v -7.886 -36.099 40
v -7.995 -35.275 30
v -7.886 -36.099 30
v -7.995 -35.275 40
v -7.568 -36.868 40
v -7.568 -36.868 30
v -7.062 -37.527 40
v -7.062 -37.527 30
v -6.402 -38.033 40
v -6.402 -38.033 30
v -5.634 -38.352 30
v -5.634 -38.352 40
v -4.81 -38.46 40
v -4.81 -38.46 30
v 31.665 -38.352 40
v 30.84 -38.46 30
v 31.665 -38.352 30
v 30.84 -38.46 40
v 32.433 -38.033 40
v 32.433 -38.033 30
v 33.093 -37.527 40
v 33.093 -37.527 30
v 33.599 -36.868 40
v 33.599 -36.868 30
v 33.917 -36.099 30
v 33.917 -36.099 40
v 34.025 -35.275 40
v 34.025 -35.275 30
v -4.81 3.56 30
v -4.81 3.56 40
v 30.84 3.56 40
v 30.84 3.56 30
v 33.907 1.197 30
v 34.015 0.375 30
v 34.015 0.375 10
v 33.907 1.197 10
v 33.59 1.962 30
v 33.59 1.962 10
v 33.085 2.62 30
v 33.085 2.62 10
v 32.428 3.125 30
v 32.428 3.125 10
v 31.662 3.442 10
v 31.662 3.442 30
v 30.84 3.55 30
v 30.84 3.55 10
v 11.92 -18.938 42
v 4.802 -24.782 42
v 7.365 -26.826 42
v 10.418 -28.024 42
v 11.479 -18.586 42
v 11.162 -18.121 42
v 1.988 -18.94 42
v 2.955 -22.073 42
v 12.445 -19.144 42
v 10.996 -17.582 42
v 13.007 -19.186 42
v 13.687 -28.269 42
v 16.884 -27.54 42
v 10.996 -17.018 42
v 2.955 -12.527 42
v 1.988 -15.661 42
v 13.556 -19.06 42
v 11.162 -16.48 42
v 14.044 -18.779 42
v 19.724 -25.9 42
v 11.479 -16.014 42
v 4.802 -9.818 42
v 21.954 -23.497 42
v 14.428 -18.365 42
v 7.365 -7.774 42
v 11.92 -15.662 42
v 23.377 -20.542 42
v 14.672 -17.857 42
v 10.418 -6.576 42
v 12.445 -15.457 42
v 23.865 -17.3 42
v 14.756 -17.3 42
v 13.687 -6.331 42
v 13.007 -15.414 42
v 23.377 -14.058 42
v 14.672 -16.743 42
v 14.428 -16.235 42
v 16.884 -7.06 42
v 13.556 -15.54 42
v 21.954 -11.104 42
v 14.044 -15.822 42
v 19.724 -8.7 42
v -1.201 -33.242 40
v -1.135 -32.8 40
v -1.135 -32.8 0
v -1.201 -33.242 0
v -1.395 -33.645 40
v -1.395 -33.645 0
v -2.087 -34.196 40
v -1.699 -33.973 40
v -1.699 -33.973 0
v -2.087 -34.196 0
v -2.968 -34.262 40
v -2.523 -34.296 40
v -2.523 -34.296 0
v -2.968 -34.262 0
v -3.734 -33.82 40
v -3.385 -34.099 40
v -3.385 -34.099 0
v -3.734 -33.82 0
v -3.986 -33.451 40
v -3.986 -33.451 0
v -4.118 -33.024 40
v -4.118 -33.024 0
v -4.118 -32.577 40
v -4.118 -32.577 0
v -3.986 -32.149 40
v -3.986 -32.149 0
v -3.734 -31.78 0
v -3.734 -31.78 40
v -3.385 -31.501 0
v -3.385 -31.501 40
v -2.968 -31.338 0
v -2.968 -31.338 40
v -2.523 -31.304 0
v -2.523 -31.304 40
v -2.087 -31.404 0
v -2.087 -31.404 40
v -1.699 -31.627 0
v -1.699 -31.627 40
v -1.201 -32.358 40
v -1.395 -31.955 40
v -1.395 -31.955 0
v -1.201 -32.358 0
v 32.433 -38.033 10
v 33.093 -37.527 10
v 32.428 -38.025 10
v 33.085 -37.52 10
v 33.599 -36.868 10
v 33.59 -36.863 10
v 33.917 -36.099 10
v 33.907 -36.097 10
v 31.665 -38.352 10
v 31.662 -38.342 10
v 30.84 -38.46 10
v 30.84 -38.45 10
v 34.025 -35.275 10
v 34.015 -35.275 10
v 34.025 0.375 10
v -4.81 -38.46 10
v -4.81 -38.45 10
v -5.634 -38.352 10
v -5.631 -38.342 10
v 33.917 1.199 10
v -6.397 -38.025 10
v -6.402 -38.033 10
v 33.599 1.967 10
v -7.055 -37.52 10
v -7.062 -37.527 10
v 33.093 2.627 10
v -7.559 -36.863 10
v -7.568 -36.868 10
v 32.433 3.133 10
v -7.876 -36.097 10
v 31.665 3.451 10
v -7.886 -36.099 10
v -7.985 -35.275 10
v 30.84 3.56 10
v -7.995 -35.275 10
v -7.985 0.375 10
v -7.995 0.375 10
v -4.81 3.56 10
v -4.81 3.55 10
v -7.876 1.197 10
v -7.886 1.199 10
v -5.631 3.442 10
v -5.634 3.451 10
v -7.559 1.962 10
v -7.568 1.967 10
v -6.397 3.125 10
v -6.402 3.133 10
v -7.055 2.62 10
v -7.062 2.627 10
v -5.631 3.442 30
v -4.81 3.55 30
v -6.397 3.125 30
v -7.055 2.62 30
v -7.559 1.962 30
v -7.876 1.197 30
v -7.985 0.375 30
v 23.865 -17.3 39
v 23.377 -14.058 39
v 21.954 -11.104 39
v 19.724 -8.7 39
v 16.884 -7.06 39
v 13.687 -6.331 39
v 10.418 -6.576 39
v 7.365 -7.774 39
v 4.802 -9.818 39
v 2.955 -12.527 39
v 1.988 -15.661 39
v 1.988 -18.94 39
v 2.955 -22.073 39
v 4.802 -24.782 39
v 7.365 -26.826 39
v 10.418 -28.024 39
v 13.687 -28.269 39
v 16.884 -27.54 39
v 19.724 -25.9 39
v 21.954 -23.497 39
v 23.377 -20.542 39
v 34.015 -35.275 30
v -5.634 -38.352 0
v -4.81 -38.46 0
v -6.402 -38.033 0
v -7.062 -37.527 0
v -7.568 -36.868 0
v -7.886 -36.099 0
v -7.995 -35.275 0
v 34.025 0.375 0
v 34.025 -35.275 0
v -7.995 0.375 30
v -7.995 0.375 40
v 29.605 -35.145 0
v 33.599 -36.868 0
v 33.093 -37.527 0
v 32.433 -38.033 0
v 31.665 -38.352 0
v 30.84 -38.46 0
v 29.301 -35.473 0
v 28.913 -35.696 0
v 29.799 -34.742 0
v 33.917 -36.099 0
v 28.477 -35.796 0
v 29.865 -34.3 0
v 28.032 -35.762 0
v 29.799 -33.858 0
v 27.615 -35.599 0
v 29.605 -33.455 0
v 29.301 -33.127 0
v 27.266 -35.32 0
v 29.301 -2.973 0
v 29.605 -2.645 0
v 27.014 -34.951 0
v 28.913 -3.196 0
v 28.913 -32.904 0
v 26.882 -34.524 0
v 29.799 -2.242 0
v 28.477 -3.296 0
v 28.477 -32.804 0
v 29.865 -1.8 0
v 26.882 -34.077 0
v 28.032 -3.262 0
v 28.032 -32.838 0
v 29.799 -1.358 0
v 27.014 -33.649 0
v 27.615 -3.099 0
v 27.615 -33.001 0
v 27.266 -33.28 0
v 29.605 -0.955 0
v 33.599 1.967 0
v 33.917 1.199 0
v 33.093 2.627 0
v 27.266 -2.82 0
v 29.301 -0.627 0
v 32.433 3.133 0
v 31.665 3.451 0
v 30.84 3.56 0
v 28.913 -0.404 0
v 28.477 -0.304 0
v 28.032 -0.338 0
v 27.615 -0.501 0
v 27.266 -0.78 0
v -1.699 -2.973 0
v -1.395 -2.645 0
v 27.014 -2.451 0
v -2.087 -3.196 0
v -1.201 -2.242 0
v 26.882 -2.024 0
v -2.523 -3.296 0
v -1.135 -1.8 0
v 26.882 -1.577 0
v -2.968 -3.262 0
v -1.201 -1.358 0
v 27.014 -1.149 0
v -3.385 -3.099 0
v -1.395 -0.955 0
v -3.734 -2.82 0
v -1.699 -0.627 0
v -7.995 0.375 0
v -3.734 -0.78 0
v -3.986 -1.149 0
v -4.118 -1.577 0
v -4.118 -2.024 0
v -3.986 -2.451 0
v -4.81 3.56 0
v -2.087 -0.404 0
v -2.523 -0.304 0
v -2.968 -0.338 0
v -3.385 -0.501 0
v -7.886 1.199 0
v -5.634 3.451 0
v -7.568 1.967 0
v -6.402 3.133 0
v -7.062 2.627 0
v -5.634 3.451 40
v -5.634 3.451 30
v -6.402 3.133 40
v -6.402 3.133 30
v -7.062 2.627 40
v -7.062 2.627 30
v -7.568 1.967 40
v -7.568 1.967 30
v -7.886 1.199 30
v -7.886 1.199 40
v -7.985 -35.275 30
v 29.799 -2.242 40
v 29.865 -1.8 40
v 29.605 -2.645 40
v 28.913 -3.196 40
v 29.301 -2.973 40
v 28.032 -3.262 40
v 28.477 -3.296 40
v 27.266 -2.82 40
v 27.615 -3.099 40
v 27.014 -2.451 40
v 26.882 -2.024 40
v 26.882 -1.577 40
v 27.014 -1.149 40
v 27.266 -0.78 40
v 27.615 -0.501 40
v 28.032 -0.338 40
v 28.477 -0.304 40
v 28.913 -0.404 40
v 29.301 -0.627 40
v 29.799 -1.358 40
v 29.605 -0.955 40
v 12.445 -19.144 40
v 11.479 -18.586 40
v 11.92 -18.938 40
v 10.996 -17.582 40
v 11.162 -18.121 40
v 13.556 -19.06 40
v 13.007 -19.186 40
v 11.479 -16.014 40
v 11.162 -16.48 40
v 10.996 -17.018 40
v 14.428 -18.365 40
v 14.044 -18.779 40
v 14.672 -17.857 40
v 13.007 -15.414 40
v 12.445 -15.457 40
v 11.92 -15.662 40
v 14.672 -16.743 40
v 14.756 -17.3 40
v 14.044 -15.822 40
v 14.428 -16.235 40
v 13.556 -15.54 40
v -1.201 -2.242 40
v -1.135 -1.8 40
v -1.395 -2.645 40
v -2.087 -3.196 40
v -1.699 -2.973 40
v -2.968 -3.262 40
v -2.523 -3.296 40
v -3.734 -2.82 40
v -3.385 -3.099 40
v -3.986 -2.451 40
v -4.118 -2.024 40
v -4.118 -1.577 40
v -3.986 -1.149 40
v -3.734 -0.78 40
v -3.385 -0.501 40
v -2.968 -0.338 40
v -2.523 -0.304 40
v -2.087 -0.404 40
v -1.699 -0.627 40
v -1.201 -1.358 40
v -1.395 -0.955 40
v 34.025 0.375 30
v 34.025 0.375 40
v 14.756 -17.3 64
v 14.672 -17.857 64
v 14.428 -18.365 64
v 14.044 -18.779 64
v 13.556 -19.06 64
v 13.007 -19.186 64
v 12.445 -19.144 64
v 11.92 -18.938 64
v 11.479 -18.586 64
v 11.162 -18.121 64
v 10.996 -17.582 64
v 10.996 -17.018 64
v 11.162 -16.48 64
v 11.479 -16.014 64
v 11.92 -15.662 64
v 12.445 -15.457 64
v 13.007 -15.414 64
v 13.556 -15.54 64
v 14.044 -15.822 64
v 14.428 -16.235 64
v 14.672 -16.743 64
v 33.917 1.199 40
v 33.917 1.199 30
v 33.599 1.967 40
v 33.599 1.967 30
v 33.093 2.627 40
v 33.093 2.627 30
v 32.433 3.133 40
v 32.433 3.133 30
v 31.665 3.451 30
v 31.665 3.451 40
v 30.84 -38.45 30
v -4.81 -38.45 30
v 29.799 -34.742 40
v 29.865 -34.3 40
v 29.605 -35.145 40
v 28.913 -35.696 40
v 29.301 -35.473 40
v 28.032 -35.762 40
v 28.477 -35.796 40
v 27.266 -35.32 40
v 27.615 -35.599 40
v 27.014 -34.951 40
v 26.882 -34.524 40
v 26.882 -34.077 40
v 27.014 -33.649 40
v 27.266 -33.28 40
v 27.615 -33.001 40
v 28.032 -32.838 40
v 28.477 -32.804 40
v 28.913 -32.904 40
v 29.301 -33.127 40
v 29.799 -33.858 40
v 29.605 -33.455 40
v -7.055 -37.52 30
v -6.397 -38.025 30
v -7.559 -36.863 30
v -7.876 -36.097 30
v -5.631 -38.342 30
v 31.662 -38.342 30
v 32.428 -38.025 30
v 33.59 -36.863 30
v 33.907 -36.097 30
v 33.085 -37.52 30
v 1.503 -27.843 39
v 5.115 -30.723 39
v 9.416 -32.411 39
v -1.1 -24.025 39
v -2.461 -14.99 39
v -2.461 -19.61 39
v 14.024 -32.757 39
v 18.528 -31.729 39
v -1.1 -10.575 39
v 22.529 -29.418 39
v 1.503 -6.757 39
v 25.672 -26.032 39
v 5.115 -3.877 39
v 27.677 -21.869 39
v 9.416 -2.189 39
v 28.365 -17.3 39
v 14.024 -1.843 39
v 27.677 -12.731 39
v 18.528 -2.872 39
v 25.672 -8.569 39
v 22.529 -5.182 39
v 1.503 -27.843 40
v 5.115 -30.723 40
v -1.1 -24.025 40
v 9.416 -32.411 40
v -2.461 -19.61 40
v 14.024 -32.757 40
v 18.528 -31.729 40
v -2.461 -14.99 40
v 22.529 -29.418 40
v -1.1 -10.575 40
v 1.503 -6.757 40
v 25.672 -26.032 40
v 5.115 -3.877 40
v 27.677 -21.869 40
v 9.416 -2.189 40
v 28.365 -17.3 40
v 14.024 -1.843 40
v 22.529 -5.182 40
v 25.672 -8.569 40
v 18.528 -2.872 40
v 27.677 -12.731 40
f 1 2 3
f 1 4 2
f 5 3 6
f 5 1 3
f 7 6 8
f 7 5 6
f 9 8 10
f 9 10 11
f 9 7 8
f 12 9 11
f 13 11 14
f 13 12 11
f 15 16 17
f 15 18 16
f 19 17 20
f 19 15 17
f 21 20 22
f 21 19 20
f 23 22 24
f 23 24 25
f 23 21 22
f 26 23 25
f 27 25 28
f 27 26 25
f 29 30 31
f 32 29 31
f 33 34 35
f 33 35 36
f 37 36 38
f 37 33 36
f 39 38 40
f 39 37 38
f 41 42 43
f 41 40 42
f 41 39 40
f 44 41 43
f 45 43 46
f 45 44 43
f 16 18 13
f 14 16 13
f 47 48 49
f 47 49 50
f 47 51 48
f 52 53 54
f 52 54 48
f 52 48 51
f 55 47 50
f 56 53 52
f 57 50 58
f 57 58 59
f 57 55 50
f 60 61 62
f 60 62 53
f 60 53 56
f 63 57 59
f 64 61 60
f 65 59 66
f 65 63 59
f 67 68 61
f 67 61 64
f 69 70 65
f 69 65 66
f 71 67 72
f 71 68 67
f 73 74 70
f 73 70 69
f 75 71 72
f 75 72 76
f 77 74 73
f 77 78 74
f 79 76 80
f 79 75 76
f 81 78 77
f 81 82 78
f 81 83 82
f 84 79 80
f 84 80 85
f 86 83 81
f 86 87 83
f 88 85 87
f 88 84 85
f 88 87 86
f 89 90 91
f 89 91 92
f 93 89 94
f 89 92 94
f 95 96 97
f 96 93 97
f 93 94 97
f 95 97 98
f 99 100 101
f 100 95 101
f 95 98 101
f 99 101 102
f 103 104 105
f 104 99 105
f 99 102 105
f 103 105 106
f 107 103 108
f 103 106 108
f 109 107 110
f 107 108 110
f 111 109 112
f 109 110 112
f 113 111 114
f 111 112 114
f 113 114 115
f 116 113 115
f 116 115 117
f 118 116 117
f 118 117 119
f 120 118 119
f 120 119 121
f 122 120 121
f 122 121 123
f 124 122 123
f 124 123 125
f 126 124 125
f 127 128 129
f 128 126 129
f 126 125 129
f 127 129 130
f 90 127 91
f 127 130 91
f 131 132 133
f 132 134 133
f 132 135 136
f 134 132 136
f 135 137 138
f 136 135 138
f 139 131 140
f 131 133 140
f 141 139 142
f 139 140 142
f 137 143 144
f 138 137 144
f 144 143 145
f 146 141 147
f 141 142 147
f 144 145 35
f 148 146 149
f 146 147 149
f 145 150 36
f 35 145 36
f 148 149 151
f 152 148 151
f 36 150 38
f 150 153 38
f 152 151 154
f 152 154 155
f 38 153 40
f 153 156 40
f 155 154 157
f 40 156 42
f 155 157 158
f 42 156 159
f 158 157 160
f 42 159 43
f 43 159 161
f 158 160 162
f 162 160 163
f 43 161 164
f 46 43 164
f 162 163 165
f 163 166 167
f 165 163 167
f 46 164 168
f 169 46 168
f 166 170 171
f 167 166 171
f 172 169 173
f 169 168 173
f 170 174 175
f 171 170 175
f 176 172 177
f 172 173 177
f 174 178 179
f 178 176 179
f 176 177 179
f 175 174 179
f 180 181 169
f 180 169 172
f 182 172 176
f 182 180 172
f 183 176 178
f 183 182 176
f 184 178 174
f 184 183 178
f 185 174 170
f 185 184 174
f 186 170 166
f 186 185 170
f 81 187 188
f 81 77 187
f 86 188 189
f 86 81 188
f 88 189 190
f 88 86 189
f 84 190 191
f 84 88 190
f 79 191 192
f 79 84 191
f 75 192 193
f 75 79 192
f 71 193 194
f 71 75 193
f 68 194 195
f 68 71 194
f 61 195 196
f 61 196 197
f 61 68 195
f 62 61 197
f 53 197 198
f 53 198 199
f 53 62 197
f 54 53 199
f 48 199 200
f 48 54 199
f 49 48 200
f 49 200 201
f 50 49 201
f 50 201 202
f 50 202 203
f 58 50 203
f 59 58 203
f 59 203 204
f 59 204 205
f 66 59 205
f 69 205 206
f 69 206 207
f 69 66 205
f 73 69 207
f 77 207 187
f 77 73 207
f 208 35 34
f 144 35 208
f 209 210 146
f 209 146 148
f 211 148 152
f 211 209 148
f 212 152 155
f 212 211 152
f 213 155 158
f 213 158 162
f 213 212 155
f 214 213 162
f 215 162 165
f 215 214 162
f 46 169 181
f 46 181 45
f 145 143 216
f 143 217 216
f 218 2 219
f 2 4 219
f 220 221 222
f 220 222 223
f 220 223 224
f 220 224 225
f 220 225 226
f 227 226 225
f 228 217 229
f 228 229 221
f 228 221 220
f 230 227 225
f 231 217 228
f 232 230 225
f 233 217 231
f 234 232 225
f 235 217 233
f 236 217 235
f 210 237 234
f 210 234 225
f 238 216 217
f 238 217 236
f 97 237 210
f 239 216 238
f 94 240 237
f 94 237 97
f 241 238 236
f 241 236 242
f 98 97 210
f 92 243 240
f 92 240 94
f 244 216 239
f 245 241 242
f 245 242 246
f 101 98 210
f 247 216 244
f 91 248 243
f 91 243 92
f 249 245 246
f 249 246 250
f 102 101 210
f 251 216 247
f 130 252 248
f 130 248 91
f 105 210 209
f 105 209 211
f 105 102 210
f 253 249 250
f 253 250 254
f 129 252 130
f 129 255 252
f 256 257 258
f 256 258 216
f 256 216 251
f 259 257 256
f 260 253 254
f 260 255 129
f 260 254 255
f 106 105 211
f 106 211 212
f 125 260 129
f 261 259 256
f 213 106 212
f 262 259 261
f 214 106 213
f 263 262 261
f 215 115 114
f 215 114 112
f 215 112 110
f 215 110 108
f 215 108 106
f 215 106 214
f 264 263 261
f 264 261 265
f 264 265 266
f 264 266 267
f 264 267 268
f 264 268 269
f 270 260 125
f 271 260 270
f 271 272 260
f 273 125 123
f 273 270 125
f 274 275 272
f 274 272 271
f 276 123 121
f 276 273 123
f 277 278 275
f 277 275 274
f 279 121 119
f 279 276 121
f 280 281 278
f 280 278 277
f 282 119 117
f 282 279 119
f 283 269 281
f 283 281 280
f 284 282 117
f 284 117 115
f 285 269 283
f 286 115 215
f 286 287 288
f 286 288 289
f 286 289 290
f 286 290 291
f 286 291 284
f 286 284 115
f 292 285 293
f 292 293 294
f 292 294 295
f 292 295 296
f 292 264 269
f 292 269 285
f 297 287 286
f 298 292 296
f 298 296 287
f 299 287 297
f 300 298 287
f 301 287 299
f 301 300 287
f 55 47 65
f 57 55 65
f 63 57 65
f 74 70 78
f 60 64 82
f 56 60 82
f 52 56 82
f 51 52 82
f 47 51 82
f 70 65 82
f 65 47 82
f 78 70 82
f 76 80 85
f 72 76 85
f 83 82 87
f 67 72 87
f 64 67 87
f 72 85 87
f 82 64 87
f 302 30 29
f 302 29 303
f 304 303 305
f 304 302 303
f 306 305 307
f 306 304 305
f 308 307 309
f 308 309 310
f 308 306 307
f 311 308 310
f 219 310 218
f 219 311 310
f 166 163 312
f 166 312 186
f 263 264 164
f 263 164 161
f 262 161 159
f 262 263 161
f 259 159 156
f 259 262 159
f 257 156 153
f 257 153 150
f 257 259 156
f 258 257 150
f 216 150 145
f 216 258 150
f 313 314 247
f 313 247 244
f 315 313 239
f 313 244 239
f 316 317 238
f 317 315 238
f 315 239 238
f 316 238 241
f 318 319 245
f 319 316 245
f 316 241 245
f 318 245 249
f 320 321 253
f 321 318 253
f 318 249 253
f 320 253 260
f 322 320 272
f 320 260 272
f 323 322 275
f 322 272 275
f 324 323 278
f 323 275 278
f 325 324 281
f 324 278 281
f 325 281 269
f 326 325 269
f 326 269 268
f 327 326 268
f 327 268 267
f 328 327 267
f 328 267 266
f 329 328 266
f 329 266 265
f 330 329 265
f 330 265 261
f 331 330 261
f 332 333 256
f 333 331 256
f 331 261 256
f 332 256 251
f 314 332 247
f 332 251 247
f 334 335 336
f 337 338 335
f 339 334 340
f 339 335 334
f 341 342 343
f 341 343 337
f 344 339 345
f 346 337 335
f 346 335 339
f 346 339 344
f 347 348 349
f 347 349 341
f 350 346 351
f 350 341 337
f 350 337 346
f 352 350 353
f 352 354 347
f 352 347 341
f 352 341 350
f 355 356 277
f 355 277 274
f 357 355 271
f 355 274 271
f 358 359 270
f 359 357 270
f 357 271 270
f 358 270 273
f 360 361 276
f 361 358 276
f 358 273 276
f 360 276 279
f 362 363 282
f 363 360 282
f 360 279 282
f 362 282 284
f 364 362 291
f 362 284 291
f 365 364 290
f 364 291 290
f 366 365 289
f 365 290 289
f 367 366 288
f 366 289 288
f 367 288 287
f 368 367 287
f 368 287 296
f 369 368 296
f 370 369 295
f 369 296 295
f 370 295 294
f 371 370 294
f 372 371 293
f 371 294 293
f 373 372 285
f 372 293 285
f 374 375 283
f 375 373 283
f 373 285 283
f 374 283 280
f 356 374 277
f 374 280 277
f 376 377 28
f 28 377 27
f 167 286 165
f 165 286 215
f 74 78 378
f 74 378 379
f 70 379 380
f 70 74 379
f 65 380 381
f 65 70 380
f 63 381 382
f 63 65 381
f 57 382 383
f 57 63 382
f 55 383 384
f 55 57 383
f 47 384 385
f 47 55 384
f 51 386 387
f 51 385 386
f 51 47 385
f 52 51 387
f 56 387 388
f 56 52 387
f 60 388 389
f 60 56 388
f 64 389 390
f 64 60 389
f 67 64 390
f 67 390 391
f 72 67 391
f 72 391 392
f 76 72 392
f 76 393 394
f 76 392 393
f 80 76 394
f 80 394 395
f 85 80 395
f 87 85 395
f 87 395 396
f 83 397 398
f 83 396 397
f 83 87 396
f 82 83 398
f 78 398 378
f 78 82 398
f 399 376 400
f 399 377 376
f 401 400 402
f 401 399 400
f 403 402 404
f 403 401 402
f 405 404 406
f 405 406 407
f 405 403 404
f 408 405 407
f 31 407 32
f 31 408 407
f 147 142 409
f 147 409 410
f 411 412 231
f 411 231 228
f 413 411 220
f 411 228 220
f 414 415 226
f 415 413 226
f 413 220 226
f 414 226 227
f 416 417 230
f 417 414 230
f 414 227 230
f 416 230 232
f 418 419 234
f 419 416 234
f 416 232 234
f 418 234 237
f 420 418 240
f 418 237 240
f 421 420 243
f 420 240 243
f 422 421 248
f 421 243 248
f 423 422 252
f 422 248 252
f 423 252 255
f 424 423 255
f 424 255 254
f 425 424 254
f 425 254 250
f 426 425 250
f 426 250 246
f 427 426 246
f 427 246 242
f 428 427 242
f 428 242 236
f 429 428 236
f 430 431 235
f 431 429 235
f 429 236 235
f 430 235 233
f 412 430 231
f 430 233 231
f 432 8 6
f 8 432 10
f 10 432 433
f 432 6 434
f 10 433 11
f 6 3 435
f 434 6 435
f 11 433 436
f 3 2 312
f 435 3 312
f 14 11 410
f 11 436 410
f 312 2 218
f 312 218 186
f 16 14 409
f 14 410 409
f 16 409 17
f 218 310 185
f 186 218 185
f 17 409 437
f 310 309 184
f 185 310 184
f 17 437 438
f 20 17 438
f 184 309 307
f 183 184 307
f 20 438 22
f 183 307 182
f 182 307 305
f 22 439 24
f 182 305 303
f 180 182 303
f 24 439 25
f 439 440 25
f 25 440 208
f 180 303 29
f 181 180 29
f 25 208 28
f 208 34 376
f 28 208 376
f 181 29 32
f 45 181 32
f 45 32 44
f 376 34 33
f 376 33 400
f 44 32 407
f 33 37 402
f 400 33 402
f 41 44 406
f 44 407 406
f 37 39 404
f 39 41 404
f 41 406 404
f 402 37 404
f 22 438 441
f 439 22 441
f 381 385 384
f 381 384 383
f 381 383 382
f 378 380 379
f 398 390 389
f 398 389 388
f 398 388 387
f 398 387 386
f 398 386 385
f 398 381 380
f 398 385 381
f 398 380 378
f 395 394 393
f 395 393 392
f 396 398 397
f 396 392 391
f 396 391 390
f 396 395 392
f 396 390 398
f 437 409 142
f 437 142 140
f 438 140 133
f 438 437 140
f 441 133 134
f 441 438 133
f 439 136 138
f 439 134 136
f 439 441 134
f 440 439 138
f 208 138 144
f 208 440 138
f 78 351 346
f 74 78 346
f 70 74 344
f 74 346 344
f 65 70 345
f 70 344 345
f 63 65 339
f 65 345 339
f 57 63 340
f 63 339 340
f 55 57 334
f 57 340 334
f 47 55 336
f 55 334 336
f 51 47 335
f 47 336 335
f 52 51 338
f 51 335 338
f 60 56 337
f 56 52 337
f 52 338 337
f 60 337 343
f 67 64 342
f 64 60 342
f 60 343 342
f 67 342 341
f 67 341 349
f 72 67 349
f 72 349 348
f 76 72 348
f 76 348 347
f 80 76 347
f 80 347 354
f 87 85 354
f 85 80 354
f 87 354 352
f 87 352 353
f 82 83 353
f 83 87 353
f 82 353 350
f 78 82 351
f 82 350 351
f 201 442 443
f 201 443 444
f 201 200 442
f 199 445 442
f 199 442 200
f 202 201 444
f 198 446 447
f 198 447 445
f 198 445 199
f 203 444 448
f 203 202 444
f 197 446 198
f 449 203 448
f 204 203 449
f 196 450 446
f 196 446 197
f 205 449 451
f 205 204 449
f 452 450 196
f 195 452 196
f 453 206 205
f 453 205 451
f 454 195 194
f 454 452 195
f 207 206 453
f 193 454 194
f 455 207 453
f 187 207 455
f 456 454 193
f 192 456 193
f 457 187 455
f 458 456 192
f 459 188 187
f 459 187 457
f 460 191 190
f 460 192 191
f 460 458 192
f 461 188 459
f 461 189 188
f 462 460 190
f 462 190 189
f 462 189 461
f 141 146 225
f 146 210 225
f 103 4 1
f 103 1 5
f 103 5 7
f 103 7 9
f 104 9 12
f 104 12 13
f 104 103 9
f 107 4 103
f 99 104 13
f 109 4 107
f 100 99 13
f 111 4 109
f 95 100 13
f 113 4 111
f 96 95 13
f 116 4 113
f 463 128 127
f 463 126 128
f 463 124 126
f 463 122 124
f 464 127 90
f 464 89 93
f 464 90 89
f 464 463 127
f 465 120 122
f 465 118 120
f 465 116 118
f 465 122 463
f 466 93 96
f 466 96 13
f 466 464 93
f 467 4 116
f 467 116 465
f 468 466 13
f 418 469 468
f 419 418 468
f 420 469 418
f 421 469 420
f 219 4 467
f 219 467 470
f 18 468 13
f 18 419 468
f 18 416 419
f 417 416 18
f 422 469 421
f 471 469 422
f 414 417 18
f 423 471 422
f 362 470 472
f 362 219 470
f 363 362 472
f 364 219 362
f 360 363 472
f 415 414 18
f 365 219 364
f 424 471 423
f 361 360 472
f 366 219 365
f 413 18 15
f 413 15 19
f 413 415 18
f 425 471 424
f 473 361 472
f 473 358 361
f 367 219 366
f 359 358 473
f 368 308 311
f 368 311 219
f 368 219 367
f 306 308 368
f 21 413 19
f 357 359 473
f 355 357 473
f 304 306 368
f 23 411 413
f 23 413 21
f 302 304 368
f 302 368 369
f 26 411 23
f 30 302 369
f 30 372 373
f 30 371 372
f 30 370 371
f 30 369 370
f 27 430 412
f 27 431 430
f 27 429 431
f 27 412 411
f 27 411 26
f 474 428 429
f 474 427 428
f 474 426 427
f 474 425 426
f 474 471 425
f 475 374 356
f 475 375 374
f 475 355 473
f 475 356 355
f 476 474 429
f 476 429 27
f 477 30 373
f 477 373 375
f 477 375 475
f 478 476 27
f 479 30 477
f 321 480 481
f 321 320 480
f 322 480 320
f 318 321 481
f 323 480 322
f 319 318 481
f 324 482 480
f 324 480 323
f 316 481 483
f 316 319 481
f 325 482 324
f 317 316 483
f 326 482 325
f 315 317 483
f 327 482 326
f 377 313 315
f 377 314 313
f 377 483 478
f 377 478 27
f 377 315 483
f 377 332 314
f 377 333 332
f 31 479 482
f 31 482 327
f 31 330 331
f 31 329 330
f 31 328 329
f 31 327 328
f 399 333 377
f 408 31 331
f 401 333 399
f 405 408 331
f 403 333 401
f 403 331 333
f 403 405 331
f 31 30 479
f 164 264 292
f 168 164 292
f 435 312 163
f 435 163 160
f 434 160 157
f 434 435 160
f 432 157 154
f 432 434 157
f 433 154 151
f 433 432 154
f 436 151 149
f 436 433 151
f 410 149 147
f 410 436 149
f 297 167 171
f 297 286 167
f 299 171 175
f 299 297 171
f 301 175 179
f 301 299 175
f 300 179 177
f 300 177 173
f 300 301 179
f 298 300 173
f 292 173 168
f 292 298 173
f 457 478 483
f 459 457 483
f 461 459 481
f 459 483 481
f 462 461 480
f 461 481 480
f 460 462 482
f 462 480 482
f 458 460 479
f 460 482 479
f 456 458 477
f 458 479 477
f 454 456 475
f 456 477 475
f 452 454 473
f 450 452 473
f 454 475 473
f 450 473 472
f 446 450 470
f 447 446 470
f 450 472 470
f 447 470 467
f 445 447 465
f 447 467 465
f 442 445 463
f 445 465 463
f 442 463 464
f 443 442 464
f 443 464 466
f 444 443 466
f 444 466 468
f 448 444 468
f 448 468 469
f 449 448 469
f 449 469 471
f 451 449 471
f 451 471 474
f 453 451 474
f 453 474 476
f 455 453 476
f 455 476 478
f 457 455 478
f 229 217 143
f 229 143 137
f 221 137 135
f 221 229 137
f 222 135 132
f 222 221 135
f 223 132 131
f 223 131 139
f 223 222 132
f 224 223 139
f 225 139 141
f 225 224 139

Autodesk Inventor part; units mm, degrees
ref_plane "YZ Plane" through (0, 0, 0) normal (1, 0, 0) x (0, 1, 0)
ref_plane "XZ Plane" through (0, 0, 0) normal (0, 1, 0) x (-1, 0, 0)
ref_plane "XY Plane" through (0, 0, 0) normal (0, 0, 1) x (1, 0, 0)
sketch "Sketch1" plane through (0, 0, 0) normal (0, 0, 1) x (1, 0, 0)
  line L0 (-7.9846, 3.5499) -> (34.0154, 3.5499)
  line L1 (34.0154, 3.5499) -> (34.0154, -38.4501)
  line L2 (34.0154, -38.4501) -> (-7.9846, -38.4501)
  line L3 (-7.9846, -38.4501) -> (-7.9846, 3.5499)
  circle A0 centre (12.8654, -17.3001) radius 11
  circle A1 centre (12.8654, -17.3001) radius 1.891
  circle A2 centre (12.8654, -17.3001) radius 15.5
  circle A3 centre (-2.6346, -32.8001) radius 1.5
  circle A4 centre (28.3654, -34.3001) radius 1.5
  circle A5 centre (28.3654, -1.8001) radius 1.5
  circle A6 centre (-2.6346, -1.8001) radius 1.5
  point P0 (0, 0)
  dimension "d0" = 42
  dimension "d1" = 42
  dimension "d2" = 22
  dimension "d3" = 31
  dimension "d4" = 3
  dimension "d5" = 3
  dimension "d6" = 3
  dimension "d7" = 3
extrude "Extrusion1" add sketch "Sketch1" along normal blind 40 contours L0 L1 L2 L3 | A0 | A1 | A2
fillet "Fillet1" radius 3.175 4 edges at (34.0154, 3.5499, 20) (-7.9846, 3.5499, 20) (34.0154, -38.4501, 20) (-7.9846, -38.4501, 20)
sketch "Sketch2" plane through (0, 0, 40) normal (0, 0, 1) x (1, 0, 0)
  circle A0 centre (12.8654, -17.3001) radius 15.5 projected
  circle A1 centre (12.8654, -17.3001) radius 1.891 projected
  circle A2 centre (12.8654, -17.3001) radius 11 projected
  point P0 (0, 0)
extrude "Extrusion2" add sketch "Sketch2" along normal blind 2 contours A2
sketch "Sketch3" plane through (0, 0, 40) normal (0, 0, 1) x (1, 0, 0)
  circle A0 centre (12.8654, -17.3001) radius 11 projected
  circle A1 centre (12.8654, -17.3001) radius 15.5 projected
  point P0 (0, 0)
extrude "Extrusion3" cut sketch "Sketch3" against normal blind 1
sketch "Sketch4" plane through (12.8654, -17.3001, 42) normal (0, 0, 1) x (1, 0, 0)
  circle A0 centre (0, 0) radius 1.891 projected
  point P0 (-12.8654, 17.3001)
extrude "Akse længde" add sketch "Sketch4" along normal blind 22
sketch "Sketch5" plane through (0, 0, 40) normal (0, 0, 1) x (1, 0, 0)
  arc A0 (-7.9846, -35.2751) -> (-4.8096, -38.4501) centre (-4.8096, -35.2751) ccw projected
  line L0 (30.8404, -38.4501) -> (-4.8096, -38.4501) projected
  arc A1 (30.8404, -38.4501) -> (34.0154, -35.2751) centre (30.8404, -35.2751) ccw projected
  line L1 (34.0154, 0.3749) -> (34.0154, -35.2751) projected
  arc A2 (34.0154, 0.3749) -> (30.8404, 3.5499) centre (30.8404, 0.3749) ccw projected
  line L2 (-4.8096, 3.5499) -> (30.8404, 3.5499) projected
  arc A3 (-4.8096, 3.5499) -> (-7.9846, 0.3749) centre (-4.8096, 0.3749) ccw projected
  line L3 (-7.9846, -35.2751) -> (-7.9846, 0.3749) projected
  arc A4 (34.0254, 0.3749) -> (30.8404, 3.5599) centre (30.8404, 0.3749) ccw
  line L4 (34.0254, 0.3749) -> (34.0254, -35.2751)
  arc A5 (30.8404, -38.4601) -> (34.0254, -35.2751) centre (30.8404, -35.2751) ccw
  line L5 (30.8404, -38.4601) -> (-4.8096, -38.4601)
  arc A6 (-7.9946, -35.2751) -> (-4.8096, -38.4601) centre (-4.8096, -35.2751) ccw
  line L6 (-7.9946, -35.2751) -> (-7.9946, 0.3749)
  arc A7 (-4.8096, 3.5599) -> (-7.9946, 0.3749) centre (-4.8096, 0.3749) ccw
  line L7 (-4.8096, 3.5599) -> (30.8404, 3.5599)
  point P0 (0, 0)
  dimension "d21" = 0.01
extrude "Extrusion5" add sketch "Sketch5" against normal blind 10
sketch "Sketch6" plane through (0, 0, 0) normal (0, 0, -1) x (-1, 0, 0)
  arc A0 (4.8096, -38.4501) -> (7.9846, -35.2751) centre (4.8096, -35.2751) ccw projected
  line L0 (7.9846, -35.2751) -> (7.9846, 0.3749) projected
  arc A1 (7.9846, 0.3749) -> (4.8096, 3.5499) centre (4.8096, 0.3749) ccw projected
  line L1 (4.8096, 3.5499) -> (-30.8404, 3.5499) projected
  arc A2 (-30.8404, 3.5499) -> (-34.0154, 0.3749) centre (-30.8404, 0.3749) ccw projected
  line L2 (-34.0154, 0.3749) -> (-34.0154, -35.2751) projected
  arc A3 (-34.0154, -35.2751) -> (-30.8404, -38.4501) centre (-30.8404, -35.2751) ccw projected
  line L3 (-30.8404, -38.4501) -> (4.8096, -38.4501) projected
  line L4 (7.9946, 0.3749) -> (7.9946, -35.2751)
  arc A4 (4.8096, -38.4601) -> (7.9946, -35.2751) centre (4.8096, -35.2751) ccw
  line L5 (4.8096, -38.4601) -> (-30.8404, -38.4601)
  arc A5 (-34.0254, -35.2751) -> (-30.8404, -38.4601) centre (-30.8404, -35.2751) ccw
  line L6 (-34.0254, -35.2751) -> (-34.0254, 0.3749)
  arc A6 (-30.8404, 3.5599) -> (-34.0254, 0.3749) centre (-30.8404, 0.3749) ccw
  line L7 (-30.8404, 3.5599) -> (4.8096, 3.5599)
  arc A7 (7.9946, 0.3749) -> (4.8096, 3.5599) centre (4.8096, 0.3749) ccw
  point P0 (0, 0)
  dimension "d22" = 0.01
extrude "Extrusion6" add sketch "Sketch6" against normal blind 10
properties part number "Nema17 - 40mm BRUG DENNE"
